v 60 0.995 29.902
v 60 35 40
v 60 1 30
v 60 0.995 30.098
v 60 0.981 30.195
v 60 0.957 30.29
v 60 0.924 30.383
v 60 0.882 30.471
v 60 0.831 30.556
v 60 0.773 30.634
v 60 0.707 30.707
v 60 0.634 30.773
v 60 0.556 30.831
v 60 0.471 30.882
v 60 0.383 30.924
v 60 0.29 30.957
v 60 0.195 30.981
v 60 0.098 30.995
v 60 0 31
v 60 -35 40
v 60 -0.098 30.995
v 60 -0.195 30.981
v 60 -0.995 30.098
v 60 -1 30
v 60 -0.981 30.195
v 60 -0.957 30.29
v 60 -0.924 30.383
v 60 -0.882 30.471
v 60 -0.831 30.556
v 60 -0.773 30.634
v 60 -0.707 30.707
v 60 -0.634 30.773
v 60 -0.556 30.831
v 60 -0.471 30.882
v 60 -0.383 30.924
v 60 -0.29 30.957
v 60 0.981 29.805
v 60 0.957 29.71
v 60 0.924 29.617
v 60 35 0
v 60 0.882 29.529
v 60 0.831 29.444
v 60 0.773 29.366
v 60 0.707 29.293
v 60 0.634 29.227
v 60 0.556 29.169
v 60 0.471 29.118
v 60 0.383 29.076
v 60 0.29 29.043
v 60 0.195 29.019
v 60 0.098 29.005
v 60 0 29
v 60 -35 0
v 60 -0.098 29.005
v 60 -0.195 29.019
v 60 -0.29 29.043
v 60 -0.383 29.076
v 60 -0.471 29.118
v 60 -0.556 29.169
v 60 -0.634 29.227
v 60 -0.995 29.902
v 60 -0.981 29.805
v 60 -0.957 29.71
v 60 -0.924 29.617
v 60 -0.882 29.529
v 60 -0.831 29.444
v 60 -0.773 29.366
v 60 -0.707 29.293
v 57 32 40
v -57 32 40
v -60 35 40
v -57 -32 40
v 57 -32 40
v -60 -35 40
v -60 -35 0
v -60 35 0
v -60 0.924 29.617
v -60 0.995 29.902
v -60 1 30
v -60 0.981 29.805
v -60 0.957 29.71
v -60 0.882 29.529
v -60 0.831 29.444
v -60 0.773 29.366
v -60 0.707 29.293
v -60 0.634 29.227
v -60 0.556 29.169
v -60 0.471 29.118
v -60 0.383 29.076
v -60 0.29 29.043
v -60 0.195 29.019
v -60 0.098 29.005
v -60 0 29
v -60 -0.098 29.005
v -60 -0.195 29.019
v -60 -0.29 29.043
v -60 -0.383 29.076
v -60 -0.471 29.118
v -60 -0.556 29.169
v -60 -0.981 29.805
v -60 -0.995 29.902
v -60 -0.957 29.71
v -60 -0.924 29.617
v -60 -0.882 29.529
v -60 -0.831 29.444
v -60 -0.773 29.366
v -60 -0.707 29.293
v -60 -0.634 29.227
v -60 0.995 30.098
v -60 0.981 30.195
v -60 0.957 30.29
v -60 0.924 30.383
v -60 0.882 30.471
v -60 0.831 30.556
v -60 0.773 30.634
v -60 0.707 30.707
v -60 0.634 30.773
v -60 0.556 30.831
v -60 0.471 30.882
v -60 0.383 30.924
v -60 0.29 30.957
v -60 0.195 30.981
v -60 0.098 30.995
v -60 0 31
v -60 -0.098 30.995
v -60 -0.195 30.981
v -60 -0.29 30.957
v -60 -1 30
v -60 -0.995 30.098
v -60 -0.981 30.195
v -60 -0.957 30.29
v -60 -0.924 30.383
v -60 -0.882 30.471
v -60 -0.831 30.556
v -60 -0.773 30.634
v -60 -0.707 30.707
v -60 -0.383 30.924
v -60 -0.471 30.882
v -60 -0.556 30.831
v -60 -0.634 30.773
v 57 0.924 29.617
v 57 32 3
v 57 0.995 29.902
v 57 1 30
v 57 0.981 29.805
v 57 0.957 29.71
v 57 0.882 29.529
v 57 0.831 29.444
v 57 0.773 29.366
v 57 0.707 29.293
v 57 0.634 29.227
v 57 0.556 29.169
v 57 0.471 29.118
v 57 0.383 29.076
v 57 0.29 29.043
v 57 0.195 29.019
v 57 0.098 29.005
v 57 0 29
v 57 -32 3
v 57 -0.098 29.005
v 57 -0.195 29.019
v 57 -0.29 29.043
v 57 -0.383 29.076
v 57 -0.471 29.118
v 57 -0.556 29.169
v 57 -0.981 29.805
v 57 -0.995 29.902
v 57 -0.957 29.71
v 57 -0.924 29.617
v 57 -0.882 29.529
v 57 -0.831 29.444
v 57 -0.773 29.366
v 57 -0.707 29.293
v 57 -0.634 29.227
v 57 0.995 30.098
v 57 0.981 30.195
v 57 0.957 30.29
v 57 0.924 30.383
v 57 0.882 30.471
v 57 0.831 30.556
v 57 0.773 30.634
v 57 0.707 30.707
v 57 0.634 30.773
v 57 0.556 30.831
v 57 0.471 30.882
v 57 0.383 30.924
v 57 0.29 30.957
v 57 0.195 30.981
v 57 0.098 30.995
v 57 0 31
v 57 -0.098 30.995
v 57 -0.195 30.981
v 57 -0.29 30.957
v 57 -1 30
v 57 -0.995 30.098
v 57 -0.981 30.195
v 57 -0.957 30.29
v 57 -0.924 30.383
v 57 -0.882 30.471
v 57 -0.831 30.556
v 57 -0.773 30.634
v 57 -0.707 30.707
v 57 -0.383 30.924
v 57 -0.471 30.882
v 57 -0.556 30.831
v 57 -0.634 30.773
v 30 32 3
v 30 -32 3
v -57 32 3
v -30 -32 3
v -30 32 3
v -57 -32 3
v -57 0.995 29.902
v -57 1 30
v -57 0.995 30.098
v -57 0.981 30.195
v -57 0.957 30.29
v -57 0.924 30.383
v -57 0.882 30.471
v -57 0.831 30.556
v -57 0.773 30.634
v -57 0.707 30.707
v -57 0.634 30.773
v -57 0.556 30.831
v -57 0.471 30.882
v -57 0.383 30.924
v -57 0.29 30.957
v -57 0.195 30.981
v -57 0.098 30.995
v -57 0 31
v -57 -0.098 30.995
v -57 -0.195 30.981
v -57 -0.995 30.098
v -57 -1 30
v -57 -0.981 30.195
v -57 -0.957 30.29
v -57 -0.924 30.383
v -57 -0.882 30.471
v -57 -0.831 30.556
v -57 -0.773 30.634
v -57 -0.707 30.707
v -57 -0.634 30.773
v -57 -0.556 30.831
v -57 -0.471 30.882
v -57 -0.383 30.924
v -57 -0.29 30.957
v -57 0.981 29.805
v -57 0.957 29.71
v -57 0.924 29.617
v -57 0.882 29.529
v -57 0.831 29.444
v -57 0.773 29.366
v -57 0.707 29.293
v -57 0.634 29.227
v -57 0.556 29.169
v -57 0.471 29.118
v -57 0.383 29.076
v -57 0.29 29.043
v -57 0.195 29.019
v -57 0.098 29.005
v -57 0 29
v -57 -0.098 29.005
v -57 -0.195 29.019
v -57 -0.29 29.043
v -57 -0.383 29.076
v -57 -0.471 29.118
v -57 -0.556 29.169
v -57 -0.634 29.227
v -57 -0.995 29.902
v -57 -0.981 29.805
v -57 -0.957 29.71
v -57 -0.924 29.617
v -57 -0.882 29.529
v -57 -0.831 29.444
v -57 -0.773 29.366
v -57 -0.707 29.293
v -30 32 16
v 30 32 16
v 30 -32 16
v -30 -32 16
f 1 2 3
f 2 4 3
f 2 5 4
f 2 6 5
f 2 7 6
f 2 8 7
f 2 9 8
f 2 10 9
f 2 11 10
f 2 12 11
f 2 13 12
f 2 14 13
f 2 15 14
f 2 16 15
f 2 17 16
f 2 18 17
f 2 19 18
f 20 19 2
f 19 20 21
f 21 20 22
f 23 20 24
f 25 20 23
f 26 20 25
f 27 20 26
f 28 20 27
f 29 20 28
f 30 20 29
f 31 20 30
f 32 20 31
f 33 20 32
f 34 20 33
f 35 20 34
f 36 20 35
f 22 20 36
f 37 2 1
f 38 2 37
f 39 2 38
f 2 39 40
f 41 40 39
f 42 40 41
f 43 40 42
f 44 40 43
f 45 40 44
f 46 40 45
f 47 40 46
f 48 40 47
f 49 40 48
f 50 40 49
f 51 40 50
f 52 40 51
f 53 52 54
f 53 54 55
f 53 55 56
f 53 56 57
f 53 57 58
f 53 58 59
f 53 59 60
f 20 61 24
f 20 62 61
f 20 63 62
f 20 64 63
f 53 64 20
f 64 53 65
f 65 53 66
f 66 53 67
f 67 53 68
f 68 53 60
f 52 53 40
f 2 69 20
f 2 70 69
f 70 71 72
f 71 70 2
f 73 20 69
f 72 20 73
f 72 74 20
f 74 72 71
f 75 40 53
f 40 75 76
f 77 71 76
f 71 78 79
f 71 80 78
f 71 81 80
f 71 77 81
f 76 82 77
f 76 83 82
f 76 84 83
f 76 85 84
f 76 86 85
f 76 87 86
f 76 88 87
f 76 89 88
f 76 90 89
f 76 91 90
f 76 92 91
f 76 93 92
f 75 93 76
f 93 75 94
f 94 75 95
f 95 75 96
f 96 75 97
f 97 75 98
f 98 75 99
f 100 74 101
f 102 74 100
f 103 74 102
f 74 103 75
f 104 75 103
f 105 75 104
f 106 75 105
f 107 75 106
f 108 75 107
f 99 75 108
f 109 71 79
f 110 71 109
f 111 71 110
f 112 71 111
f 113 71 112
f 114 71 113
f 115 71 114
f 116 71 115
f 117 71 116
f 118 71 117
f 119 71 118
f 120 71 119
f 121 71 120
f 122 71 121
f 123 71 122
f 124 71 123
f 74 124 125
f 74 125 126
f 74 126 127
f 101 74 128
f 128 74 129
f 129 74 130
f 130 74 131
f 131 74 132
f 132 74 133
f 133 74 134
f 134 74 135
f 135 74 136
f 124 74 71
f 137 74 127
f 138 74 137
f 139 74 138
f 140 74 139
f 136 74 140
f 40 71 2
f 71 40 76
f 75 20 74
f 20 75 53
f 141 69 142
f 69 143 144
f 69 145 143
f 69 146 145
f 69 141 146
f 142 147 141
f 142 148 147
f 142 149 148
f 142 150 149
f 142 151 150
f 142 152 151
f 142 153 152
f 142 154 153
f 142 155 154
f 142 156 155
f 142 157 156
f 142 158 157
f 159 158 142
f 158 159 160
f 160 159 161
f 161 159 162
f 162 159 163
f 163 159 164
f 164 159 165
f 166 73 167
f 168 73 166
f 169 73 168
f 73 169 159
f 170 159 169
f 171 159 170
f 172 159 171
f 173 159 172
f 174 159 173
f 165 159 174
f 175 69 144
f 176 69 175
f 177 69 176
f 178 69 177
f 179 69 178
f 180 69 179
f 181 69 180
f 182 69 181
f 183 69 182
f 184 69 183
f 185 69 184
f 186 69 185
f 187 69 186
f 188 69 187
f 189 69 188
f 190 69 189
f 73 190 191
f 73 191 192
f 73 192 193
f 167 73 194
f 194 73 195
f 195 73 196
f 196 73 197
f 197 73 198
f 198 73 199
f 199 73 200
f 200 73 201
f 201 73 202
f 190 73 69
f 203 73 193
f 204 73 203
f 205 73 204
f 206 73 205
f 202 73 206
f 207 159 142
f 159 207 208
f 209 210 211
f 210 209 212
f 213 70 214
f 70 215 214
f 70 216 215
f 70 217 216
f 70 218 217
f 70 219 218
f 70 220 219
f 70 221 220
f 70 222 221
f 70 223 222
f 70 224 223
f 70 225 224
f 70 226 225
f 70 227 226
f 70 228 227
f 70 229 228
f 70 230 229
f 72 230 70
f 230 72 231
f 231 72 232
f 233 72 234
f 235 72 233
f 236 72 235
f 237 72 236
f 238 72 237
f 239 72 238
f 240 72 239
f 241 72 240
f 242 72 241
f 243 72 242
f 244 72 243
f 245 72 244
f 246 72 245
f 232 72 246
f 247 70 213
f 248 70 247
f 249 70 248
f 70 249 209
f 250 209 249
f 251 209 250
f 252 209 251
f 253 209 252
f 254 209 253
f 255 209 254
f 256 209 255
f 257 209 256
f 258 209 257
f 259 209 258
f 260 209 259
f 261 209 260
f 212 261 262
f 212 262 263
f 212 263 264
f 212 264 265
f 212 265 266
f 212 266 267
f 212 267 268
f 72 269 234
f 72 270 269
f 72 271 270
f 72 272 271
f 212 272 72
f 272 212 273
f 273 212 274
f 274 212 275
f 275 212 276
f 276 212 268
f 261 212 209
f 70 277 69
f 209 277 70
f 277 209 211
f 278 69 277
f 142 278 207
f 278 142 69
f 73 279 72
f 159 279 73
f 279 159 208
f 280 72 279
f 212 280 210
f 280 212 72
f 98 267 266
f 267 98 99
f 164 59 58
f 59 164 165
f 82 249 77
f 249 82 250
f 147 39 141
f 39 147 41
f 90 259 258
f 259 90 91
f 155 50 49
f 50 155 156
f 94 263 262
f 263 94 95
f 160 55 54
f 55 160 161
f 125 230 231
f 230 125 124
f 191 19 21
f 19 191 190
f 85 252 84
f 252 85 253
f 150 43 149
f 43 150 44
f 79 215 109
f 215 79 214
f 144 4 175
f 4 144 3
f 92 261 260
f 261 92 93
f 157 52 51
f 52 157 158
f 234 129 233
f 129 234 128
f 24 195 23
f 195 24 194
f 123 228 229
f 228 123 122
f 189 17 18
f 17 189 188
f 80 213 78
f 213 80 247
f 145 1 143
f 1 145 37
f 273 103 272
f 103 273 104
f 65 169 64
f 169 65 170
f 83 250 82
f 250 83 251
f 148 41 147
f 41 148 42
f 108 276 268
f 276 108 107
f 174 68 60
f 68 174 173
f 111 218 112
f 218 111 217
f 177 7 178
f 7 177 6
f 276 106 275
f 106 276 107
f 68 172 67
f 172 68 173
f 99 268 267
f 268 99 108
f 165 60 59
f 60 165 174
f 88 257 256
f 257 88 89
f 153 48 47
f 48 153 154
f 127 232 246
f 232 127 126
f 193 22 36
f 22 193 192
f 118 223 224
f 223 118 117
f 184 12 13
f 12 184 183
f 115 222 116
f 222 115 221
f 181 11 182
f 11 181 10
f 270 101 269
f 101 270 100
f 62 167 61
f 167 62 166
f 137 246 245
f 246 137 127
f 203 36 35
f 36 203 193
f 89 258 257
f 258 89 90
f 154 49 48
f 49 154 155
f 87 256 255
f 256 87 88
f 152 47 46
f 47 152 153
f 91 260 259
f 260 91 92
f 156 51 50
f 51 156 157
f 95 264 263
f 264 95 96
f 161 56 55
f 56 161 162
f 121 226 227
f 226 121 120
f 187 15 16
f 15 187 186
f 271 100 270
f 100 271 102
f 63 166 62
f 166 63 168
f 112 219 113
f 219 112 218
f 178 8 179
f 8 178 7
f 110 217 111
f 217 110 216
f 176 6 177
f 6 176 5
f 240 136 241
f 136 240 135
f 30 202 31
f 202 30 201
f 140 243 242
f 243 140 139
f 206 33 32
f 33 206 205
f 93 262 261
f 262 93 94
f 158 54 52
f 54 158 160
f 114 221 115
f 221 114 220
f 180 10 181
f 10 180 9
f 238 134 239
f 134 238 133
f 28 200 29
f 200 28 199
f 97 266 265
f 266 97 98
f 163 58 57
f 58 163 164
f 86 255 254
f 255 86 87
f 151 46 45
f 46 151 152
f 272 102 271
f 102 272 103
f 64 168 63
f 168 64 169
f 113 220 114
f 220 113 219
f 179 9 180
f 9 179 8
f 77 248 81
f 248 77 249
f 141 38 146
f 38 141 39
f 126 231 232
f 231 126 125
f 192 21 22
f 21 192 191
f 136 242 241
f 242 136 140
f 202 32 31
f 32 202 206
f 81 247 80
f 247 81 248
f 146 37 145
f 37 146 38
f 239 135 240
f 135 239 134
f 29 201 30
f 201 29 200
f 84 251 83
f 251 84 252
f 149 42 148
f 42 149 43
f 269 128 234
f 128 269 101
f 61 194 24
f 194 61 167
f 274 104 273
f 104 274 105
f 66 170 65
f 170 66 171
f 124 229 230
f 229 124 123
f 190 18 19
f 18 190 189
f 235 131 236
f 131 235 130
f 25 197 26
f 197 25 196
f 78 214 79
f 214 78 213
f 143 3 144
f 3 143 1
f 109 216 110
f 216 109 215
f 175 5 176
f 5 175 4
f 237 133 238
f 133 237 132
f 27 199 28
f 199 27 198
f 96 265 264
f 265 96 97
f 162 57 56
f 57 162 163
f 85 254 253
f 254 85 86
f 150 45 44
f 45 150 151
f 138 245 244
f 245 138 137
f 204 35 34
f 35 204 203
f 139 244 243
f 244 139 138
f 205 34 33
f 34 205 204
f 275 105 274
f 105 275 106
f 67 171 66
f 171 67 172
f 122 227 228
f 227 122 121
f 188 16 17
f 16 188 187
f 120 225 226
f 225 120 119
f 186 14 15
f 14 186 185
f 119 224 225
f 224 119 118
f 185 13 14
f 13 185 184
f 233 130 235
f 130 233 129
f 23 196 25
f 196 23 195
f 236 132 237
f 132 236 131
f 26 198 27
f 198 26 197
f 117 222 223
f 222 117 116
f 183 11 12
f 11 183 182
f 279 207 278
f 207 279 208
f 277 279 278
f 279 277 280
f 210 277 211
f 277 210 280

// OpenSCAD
// Buffer tank for mini horizontal gel-electrophoresis box
// Corrected version: Rests on Z=0, centered on XY, correct hole positioning.

// --- Dimensions ---
L             = 120.0; // Outer Length (X)
W             = 70.0;  // Outer Width (Y)
H             = 40.0;  // Outer Height (Z)
wall          = 3.0;   // Wall thickness
floor         = 3.0;   // Floor thickness
platform_len  = 60.0;  // Platform length (X)
platform_h_rel = 13.0; // Platform height above inner floor
hole_d        = 2.0;   // Electrode hole diameter
hole_y_pos    = 0.0;   // Y position of holes (centered)
hole_z_pos    = 30.0;  // Z position of holes (absolute from Z=0)

$fn = 64;

// --- Calculations ---
inner_l = L - 2 * wall;
inner_w = W - 2 * wall;

// --- Modeling ---

// The part must rest on the XY plane at z = 0.
// We build the tank and then center it on X and Y.

module tank_shell() {
    difference() {
        // Main outer block (starts at Z=0)
        cube([L, W, H]);
        
        // Subtract the interior volume
        // Interior starts at Z = floor
        translate([wall, wall, floor])
            cube([inner_l, inner_w, H]);
            
        // Electrode holes (Horizontal along X)
        // Positioned at Y = W/2 (center), Z = hole_z_pos
        // We use a large cylinder to ensure it pierces the walls.
        translate([-1, W/2 + hole_y_pos, hole_z_pos])
            rotate([0, 90, 0])
                cylinder(h = L + 2, d = hole_d);
    }
}

module platform() {
    // The platform is a solid inside the tank.
    // It sits on the floor (Z = floor) and goes up to (floor + platform_h_rel)
    // It is centered in X and spans full inner Y.
    // In absolute coordinates:
    // Z_bottom = floor
    // Z_top = floor + platform_h_rel
    // X_center = L/2
    // Y_center = W/2
    
    translate([L/2 - platform_len/2, wall, floor])
        cube([platform_len, inner_w, platform_h_rel]);
}

// --- Final Assembly ---
// Center the whole assembly on X and Y, but keep Z at 0.
translate([-L/2, -W/2, 0]) {
    union() {
        tank_shell();
        platform();
    }
}
